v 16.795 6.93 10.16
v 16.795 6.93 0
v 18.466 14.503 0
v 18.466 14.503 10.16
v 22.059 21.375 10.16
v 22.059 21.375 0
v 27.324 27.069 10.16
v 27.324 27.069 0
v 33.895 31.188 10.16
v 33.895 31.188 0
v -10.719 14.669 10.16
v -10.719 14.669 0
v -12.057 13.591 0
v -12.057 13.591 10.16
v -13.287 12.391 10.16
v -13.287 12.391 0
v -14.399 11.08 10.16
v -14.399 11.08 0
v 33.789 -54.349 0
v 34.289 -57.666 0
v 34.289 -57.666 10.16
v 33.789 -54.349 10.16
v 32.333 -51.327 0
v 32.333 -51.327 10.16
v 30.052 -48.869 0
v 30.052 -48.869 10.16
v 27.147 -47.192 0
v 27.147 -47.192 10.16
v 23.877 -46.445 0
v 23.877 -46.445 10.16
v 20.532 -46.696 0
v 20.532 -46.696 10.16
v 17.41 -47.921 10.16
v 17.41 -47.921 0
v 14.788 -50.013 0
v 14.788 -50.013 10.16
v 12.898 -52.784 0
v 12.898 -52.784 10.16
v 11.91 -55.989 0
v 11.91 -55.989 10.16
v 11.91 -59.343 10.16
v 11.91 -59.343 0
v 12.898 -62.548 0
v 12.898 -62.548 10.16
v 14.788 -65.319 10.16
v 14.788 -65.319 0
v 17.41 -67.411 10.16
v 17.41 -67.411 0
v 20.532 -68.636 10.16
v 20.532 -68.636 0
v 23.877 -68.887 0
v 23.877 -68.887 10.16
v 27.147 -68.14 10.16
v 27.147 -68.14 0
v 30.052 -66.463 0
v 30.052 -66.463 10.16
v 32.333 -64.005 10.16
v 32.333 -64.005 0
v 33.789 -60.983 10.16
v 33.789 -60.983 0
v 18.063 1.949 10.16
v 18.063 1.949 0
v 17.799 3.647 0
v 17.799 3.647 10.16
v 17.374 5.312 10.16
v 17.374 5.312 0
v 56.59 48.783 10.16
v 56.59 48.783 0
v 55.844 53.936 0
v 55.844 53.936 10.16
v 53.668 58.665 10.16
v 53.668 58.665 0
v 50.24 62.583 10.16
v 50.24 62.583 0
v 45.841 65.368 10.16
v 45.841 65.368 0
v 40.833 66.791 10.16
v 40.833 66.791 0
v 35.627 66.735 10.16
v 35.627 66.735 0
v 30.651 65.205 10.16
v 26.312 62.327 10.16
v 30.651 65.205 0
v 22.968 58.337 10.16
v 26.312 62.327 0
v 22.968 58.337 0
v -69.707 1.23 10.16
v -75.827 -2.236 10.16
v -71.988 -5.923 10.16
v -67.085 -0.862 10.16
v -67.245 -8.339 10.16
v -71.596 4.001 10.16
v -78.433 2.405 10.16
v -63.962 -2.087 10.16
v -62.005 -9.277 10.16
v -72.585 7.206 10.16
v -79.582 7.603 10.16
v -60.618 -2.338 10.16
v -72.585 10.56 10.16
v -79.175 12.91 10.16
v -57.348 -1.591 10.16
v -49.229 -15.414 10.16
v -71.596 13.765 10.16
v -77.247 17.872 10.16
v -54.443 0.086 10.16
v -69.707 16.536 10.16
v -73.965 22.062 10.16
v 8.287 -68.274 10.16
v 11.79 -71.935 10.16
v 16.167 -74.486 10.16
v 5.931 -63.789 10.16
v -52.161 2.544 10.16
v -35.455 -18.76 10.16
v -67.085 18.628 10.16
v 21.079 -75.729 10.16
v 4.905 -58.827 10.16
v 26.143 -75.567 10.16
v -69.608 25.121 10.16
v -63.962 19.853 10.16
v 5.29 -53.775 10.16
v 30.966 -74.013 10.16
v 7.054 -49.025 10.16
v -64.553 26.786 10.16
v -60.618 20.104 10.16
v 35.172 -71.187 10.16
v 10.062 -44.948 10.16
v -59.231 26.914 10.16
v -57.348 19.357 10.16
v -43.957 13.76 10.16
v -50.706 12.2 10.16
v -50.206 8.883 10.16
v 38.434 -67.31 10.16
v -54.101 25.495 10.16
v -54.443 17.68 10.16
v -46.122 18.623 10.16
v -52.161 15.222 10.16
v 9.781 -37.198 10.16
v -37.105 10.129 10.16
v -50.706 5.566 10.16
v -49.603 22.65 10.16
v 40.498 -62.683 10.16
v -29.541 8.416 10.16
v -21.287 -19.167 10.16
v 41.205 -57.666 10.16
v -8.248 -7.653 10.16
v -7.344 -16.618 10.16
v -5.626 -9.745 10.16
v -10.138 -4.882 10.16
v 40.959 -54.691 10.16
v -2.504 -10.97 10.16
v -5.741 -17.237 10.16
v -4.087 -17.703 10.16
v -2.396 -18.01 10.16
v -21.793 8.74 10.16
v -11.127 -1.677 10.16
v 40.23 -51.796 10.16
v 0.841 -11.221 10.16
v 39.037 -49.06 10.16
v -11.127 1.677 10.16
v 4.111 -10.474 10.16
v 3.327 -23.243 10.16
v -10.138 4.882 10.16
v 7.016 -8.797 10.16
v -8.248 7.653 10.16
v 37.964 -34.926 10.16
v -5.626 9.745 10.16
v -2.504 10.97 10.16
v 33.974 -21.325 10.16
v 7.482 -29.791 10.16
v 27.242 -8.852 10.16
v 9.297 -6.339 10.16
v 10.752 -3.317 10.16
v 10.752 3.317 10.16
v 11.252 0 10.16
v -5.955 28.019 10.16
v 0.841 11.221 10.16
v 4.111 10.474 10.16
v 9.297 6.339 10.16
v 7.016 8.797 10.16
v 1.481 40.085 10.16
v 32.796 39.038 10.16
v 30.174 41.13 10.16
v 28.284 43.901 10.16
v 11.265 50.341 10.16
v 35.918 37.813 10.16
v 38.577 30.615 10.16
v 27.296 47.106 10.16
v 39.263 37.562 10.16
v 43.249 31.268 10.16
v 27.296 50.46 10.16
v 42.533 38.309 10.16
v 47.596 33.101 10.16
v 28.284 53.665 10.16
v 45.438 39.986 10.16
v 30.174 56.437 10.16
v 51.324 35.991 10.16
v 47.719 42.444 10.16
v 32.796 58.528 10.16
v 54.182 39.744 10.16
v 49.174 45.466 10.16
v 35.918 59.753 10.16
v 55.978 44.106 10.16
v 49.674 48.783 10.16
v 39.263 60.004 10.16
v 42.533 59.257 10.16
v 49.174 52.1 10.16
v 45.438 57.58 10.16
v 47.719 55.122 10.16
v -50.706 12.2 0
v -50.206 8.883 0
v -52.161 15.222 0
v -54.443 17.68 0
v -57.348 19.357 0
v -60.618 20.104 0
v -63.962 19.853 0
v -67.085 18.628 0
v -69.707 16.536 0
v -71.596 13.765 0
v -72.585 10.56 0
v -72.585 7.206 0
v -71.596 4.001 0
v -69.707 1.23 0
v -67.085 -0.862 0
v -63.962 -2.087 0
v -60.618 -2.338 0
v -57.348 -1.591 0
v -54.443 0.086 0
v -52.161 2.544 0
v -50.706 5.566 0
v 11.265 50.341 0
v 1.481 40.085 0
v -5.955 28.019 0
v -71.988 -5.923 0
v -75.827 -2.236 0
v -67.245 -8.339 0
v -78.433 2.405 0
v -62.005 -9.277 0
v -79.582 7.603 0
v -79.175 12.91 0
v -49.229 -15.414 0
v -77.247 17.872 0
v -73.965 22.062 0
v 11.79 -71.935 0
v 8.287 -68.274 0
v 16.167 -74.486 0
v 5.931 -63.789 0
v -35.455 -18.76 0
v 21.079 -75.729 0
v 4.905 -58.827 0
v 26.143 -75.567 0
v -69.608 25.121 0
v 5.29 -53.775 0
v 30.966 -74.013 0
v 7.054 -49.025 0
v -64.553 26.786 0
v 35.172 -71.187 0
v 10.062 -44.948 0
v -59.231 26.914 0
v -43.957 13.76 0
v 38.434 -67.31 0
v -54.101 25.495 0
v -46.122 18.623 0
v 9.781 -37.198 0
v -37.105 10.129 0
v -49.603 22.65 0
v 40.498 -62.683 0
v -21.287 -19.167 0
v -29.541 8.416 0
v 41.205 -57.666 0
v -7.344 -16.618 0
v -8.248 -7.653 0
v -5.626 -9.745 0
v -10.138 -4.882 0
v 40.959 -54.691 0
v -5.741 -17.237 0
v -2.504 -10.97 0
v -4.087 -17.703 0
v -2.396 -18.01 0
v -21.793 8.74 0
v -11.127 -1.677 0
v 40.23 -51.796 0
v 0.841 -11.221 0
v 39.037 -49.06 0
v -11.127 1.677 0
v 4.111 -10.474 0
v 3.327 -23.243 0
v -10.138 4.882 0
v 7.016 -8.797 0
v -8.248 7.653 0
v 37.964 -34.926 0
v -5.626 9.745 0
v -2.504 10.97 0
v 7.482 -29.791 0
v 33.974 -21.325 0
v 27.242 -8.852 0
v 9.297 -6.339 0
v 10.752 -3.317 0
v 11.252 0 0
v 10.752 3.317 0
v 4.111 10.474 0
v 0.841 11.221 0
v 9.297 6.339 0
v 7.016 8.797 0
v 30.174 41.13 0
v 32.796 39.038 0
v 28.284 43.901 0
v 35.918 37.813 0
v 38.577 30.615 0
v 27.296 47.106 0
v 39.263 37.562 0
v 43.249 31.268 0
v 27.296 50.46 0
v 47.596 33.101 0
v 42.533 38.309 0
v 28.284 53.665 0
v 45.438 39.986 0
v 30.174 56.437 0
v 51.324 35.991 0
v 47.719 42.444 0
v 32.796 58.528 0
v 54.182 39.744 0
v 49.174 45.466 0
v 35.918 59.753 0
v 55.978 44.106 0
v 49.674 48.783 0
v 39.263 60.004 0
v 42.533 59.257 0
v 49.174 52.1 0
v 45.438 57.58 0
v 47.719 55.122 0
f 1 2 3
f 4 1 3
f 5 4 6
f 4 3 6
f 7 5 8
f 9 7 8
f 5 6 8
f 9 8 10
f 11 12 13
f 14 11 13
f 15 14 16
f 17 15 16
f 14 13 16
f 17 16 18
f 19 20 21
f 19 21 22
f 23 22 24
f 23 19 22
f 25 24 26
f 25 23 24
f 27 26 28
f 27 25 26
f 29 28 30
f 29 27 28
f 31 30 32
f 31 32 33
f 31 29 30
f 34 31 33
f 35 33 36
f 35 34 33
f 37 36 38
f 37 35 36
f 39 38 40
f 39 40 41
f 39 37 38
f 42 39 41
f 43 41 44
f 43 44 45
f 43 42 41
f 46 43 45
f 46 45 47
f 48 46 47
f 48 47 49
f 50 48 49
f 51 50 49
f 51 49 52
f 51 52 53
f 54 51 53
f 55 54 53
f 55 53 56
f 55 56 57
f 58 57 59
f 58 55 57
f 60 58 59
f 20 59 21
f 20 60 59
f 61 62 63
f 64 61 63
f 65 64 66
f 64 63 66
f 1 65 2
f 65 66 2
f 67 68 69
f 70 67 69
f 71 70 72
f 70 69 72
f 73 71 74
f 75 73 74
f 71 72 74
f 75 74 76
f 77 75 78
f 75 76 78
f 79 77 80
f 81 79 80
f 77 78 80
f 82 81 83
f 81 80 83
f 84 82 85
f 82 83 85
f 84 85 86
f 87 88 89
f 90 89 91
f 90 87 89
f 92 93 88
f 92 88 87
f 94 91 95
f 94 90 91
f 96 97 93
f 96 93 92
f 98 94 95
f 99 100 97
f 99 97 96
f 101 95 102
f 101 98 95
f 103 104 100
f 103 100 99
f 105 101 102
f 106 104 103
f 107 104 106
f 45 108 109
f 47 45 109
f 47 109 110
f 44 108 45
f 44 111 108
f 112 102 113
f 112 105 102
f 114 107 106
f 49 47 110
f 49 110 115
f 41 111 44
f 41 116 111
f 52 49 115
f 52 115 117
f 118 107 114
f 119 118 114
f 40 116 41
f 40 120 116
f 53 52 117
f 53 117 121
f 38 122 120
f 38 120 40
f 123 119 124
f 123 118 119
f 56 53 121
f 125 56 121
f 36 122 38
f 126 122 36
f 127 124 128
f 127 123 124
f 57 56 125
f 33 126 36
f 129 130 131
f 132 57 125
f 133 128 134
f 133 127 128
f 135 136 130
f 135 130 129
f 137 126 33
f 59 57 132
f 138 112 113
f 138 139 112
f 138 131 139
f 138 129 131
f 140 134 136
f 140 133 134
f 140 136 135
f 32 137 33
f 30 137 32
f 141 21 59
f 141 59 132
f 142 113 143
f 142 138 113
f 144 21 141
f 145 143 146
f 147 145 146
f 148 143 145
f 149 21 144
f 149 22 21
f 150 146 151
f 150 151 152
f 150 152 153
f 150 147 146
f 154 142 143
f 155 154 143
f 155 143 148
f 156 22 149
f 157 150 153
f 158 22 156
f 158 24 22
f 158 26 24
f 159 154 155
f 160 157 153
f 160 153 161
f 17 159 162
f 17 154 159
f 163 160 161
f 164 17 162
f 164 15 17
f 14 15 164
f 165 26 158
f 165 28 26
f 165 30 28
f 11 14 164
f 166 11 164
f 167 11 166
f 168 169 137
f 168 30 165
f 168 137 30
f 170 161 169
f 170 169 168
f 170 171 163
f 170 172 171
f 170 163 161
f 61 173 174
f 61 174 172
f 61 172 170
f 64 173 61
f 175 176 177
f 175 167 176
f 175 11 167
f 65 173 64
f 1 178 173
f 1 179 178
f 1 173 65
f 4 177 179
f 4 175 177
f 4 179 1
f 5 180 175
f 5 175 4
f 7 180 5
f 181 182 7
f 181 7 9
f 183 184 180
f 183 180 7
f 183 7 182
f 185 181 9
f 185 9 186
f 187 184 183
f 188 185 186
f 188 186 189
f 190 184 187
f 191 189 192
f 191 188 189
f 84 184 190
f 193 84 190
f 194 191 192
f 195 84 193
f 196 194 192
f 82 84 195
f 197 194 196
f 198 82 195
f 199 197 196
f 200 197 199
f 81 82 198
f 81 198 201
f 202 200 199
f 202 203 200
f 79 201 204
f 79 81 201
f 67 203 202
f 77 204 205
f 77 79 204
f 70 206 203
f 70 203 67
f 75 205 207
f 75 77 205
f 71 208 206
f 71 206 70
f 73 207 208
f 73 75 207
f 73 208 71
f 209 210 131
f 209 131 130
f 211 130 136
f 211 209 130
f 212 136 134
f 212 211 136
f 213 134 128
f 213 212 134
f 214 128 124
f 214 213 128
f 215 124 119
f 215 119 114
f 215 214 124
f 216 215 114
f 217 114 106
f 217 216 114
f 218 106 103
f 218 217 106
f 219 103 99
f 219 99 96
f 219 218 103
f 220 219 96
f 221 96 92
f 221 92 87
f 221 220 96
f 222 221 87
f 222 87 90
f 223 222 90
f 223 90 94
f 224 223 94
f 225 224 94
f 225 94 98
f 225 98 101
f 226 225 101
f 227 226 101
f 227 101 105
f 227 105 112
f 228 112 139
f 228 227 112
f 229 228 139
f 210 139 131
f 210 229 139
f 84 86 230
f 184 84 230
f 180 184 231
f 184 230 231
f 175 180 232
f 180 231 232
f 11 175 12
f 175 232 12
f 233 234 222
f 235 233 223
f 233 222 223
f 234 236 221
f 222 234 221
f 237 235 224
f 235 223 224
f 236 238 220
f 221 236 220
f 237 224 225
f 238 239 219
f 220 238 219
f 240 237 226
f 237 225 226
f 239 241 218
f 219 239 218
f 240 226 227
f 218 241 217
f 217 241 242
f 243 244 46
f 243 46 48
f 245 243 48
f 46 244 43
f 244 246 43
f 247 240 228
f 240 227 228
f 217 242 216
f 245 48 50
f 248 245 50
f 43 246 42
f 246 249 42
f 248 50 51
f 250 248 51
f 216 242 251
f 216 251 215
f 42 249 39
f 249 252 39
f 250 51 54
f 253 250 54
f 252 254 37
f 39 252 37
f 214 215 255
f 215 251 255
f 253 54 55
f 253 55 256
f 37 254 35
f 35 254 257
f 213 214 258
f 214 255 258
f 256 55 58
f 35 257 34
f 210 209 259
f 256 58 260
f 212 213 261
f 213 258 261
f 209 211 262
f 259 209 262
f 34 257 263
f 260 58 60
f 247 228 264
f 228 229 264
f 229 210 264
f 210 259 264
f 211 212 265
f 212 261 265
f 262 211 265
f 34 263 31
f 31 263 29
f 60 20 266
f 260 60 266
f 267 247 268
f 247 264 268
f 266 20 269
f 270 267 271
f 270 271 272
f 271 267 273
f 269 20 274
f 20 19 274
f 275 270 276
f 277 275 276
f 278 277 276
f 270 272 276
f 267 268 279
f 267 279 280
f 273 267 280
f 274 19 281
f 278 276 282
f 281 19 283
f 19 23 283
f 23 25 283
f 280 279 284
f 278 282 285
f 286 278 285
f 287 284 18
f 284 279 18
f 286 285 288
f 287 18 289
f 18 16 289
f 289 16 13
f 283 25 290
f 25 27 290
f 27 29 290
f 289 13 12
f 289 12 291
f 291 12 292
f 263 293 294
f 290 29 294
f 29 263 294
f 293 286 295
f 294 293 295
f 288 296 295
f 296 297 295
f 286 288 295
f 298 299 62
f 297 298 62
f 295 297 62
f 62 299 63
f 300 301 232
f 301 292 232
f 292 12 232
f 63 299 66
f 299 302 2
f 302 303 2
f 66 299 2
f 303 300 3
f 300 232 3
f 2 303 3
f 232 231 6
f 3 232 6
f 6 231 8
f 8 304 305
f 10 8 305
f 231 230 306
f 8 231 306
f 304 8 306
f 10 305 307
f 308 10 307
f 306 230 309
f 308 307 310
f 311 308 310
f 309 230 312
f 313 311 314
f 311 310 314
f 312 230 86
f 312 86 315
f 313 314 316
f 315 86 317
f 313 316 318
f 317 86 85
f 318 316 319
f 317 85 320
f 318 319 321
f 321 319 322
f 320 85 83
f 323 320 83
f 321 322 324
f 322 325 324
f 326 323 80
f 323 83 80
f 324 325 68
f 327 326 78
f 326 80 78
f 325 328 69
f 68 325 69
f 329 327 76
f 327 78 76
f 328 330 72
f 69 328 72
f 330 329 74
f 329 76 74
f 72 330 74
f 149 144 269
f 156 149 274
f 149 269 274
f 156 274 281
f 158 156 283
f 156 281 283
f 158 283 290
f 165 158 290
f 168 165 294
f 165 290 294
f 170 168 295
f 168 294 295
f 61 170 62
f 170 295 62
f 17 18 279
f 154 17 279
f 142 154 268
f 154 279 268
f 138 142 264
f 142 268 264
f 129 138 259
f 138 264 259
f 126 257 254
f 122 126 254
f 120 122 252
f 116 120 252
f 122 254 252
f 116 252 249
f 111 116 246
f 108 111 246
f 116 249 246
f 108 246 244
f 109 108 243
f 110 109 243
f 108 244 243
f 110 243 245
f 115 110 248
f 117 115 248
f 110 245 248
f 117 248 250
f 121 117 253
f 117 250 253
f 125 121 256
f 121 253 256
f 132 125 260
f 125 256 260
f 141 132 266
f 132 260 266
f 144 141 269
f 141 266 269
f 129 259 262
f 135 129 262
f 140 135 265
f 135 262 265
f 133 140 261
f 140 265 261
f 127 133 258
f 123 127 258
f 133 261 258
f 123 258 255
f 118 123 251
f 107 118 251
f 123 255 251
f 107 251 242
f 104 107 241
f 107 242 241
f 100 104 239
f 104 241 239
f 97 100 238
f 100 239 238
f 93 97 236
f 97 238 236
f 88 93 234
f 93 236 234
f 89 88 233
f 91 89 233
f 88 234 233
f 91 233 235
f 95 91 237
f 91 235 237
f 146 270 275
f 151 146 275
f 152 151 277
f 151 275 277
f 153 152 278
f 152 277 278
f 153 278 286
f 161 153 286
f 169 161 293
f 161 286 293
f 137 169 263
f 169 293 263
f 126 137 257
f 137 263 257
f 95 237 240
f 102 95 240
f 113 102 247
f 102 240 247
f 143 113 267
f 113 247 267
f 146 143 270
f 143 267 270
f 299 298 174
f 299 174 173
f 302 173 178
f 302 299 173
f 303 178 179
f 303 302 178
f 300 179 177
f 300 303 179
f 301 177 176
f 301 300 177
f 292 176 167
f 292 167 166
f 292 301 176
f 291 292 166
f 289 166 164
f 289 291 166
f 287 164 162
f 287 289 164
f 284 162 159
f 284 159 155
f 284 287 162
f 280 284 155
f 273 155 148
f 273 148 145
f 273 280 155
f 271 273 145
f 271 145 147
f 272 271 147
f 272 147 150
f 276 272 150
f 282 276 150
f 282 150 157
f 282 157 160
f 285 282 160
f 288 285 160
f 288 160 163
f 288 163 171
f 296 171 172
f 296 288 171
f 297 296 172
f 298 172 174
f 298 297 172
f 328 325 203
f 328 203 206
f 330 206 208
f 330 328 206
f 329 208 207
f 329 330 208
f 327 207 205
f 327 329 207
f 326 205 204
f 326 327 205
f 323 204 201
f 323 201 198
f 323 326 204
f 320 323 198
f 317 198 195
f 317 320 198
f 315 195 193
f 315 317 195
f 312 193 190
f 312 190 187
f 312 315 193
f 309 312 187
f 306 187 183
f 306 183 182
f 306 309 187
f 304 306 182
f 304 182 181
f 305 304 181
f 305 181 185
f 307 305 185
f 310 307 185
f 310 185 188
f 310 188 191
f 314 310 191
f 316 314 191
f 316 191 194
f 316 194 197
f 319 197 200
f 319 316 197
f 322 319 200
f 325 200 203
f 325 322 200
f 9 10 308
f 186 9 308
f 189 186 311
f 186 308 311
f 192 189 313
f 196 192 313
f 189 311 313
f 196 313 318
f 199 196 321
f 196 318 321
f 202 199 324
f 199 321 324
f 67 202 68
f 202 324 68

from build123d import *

# Parameters (mm, degrees)
F0_R     = 11.2522
F1_DEPTH = 10.16


with BuildPart() as f1:
    # F0 (on Top) → F1 (new body)
    with BuildSketch(Plane.XY):
        with BuildLine():
            ThreePointArc((-10.719341, 14.669081), (4.919614, 17.489528), (16.794827, 6.929645))
            ThreePointArc((16.794827, 6.929645), (22.058644, 21.375356), (33.895097, 31.187832))
            ThreePointArc((33.895097, 31.187832), (21.56764, 41.999689), (22.968486, 58.336766))
            ThreePointArc((22.968486, 58.336766), (1.481286, 40.085028), (-10.719341, 14.669081))
        make_face()
        with BuildLine():
            ThreePointArc((22.968486, 58.336766), (21.56764, 41.999689), (33.895097, 31.187832))
            ThreePointArc((33.895097, 31.187832), (49.553982, 34.424571), (56.590345, 48.783079))
            ThreePointArc((56.590345, 48.783079), (43.388016, 66.259508), (22.968486, 58.336766))
        make_face()
        with Locations((38.42207, 48.783079)):
            Circle(F0_R, mode=Mode.SUBTRACT)
        with BuildLine():
            ThreePointArc((18.063467, 1.948681), (18.142054, 0.975749), (18.168275, 0))
            ThreePointArc((18.168275, 0), (11.969796, -13.667852), (-2.396165, -18.00957))
            ThreePointArc((-2.396165, -18.00957), (7.482279, -29.791024), (10.061906, -44.947931))
            ThreePointArc((10.061906, -44.947931), (25.588977, -39.677969), (39.036878, -49.059675))
            ThreePointArc((39.036878, -49.059675), (33.97401, -21.325346), (18.063467, 1.948681))
        make_face()
        with BuildLine():
            ThreePointArc((-2.396165, -18.00957), (11.969796, -13.667852), (18.168275, 0))
            ThreePointArc((18.168275, 0), (18.142054, 0.975749), (18.063467, 1.948681))
            ThreePointArc((18.063467, 1.948681), (17.606183, 4.484254), (16.794827, 6.929645))
            ThreePointArc((16.794827, 6.929645), (4.919614, 17.489528), (-10.719341, 14.669081))
            ThreePointArc((-10.719341, 14.669081), (-12.686569, 13.005275), (-14.398662, 11.079924))
            ThreePointArc((-14.398662, 11.079924), (-17.606183, -4.484254), (-7.344126, -16.617762))
            ThreePointArc((-7.344126, -16.617762), (-4.919614, -17.489528), (-2.396165, -18.00957))
        make_face()
        Circle(F0_R, mode=Mode.SUBTRACT)
        with BuildLine():
            ThreePointArc((-43.957003, 13.760099), (-75.760224, 20.08762), (-62.005364, -9.27709))
            ThreePointArc((-62.005364, -9.27709), (-48.806362, -4.1559), (-43.290146, 8.88295))
            ThreePointArc((-43.290146, 8.88295), (-43.457632, 11.344214), (-43.957003, 13.760099))
        make_face()
        with Locations((-61.458421, 8.88295)):
            Circle(F0_R, mode=Mode.SUBTRACT)
        with BuildLine():
            ThreePointArc((-62.005364, -9.27709), (-35.455296, -18.759683), (-7.344126, -16.617762))
            ThreePointArc((-7.344126, -16.617762), (-17.606183, -4.484254), (-14.398662, 11.079924))
            ThreePointArc((-14.398662, 11.079924), (-29.540923, 8.415668), (-43.957003, 13.760099))
            ThreePointArc((-43.957003, 13.760099), (-43.457632, 11.344214), (-43.290146, 8.88295))
            ThreePointArc((-43.290146, 8.88295), (-48.806362, -4.1559), (-62.005364, -9.27709))
        make_face()
        with BuildLine():
            ThreePointArc((41.204625, -57.666028), (40.654355, -53.228449), (39.036878, -49.059675))
            ThreePointArc((39.036878, -49.059675), (25.588977, -39.677969), (10.061906, -44.947931))
            ThreePointArc((10.061906, -44.947931), (16.167473, -74.485801), (41.204625, -57.666028))
        make_face()
        with Locations((23.03635, -57.666028)):
            Circle(F0_R, mode=Mode.SUBTRACT)
    extrude(amount=F1_DEPTH)


solid = f1.part
